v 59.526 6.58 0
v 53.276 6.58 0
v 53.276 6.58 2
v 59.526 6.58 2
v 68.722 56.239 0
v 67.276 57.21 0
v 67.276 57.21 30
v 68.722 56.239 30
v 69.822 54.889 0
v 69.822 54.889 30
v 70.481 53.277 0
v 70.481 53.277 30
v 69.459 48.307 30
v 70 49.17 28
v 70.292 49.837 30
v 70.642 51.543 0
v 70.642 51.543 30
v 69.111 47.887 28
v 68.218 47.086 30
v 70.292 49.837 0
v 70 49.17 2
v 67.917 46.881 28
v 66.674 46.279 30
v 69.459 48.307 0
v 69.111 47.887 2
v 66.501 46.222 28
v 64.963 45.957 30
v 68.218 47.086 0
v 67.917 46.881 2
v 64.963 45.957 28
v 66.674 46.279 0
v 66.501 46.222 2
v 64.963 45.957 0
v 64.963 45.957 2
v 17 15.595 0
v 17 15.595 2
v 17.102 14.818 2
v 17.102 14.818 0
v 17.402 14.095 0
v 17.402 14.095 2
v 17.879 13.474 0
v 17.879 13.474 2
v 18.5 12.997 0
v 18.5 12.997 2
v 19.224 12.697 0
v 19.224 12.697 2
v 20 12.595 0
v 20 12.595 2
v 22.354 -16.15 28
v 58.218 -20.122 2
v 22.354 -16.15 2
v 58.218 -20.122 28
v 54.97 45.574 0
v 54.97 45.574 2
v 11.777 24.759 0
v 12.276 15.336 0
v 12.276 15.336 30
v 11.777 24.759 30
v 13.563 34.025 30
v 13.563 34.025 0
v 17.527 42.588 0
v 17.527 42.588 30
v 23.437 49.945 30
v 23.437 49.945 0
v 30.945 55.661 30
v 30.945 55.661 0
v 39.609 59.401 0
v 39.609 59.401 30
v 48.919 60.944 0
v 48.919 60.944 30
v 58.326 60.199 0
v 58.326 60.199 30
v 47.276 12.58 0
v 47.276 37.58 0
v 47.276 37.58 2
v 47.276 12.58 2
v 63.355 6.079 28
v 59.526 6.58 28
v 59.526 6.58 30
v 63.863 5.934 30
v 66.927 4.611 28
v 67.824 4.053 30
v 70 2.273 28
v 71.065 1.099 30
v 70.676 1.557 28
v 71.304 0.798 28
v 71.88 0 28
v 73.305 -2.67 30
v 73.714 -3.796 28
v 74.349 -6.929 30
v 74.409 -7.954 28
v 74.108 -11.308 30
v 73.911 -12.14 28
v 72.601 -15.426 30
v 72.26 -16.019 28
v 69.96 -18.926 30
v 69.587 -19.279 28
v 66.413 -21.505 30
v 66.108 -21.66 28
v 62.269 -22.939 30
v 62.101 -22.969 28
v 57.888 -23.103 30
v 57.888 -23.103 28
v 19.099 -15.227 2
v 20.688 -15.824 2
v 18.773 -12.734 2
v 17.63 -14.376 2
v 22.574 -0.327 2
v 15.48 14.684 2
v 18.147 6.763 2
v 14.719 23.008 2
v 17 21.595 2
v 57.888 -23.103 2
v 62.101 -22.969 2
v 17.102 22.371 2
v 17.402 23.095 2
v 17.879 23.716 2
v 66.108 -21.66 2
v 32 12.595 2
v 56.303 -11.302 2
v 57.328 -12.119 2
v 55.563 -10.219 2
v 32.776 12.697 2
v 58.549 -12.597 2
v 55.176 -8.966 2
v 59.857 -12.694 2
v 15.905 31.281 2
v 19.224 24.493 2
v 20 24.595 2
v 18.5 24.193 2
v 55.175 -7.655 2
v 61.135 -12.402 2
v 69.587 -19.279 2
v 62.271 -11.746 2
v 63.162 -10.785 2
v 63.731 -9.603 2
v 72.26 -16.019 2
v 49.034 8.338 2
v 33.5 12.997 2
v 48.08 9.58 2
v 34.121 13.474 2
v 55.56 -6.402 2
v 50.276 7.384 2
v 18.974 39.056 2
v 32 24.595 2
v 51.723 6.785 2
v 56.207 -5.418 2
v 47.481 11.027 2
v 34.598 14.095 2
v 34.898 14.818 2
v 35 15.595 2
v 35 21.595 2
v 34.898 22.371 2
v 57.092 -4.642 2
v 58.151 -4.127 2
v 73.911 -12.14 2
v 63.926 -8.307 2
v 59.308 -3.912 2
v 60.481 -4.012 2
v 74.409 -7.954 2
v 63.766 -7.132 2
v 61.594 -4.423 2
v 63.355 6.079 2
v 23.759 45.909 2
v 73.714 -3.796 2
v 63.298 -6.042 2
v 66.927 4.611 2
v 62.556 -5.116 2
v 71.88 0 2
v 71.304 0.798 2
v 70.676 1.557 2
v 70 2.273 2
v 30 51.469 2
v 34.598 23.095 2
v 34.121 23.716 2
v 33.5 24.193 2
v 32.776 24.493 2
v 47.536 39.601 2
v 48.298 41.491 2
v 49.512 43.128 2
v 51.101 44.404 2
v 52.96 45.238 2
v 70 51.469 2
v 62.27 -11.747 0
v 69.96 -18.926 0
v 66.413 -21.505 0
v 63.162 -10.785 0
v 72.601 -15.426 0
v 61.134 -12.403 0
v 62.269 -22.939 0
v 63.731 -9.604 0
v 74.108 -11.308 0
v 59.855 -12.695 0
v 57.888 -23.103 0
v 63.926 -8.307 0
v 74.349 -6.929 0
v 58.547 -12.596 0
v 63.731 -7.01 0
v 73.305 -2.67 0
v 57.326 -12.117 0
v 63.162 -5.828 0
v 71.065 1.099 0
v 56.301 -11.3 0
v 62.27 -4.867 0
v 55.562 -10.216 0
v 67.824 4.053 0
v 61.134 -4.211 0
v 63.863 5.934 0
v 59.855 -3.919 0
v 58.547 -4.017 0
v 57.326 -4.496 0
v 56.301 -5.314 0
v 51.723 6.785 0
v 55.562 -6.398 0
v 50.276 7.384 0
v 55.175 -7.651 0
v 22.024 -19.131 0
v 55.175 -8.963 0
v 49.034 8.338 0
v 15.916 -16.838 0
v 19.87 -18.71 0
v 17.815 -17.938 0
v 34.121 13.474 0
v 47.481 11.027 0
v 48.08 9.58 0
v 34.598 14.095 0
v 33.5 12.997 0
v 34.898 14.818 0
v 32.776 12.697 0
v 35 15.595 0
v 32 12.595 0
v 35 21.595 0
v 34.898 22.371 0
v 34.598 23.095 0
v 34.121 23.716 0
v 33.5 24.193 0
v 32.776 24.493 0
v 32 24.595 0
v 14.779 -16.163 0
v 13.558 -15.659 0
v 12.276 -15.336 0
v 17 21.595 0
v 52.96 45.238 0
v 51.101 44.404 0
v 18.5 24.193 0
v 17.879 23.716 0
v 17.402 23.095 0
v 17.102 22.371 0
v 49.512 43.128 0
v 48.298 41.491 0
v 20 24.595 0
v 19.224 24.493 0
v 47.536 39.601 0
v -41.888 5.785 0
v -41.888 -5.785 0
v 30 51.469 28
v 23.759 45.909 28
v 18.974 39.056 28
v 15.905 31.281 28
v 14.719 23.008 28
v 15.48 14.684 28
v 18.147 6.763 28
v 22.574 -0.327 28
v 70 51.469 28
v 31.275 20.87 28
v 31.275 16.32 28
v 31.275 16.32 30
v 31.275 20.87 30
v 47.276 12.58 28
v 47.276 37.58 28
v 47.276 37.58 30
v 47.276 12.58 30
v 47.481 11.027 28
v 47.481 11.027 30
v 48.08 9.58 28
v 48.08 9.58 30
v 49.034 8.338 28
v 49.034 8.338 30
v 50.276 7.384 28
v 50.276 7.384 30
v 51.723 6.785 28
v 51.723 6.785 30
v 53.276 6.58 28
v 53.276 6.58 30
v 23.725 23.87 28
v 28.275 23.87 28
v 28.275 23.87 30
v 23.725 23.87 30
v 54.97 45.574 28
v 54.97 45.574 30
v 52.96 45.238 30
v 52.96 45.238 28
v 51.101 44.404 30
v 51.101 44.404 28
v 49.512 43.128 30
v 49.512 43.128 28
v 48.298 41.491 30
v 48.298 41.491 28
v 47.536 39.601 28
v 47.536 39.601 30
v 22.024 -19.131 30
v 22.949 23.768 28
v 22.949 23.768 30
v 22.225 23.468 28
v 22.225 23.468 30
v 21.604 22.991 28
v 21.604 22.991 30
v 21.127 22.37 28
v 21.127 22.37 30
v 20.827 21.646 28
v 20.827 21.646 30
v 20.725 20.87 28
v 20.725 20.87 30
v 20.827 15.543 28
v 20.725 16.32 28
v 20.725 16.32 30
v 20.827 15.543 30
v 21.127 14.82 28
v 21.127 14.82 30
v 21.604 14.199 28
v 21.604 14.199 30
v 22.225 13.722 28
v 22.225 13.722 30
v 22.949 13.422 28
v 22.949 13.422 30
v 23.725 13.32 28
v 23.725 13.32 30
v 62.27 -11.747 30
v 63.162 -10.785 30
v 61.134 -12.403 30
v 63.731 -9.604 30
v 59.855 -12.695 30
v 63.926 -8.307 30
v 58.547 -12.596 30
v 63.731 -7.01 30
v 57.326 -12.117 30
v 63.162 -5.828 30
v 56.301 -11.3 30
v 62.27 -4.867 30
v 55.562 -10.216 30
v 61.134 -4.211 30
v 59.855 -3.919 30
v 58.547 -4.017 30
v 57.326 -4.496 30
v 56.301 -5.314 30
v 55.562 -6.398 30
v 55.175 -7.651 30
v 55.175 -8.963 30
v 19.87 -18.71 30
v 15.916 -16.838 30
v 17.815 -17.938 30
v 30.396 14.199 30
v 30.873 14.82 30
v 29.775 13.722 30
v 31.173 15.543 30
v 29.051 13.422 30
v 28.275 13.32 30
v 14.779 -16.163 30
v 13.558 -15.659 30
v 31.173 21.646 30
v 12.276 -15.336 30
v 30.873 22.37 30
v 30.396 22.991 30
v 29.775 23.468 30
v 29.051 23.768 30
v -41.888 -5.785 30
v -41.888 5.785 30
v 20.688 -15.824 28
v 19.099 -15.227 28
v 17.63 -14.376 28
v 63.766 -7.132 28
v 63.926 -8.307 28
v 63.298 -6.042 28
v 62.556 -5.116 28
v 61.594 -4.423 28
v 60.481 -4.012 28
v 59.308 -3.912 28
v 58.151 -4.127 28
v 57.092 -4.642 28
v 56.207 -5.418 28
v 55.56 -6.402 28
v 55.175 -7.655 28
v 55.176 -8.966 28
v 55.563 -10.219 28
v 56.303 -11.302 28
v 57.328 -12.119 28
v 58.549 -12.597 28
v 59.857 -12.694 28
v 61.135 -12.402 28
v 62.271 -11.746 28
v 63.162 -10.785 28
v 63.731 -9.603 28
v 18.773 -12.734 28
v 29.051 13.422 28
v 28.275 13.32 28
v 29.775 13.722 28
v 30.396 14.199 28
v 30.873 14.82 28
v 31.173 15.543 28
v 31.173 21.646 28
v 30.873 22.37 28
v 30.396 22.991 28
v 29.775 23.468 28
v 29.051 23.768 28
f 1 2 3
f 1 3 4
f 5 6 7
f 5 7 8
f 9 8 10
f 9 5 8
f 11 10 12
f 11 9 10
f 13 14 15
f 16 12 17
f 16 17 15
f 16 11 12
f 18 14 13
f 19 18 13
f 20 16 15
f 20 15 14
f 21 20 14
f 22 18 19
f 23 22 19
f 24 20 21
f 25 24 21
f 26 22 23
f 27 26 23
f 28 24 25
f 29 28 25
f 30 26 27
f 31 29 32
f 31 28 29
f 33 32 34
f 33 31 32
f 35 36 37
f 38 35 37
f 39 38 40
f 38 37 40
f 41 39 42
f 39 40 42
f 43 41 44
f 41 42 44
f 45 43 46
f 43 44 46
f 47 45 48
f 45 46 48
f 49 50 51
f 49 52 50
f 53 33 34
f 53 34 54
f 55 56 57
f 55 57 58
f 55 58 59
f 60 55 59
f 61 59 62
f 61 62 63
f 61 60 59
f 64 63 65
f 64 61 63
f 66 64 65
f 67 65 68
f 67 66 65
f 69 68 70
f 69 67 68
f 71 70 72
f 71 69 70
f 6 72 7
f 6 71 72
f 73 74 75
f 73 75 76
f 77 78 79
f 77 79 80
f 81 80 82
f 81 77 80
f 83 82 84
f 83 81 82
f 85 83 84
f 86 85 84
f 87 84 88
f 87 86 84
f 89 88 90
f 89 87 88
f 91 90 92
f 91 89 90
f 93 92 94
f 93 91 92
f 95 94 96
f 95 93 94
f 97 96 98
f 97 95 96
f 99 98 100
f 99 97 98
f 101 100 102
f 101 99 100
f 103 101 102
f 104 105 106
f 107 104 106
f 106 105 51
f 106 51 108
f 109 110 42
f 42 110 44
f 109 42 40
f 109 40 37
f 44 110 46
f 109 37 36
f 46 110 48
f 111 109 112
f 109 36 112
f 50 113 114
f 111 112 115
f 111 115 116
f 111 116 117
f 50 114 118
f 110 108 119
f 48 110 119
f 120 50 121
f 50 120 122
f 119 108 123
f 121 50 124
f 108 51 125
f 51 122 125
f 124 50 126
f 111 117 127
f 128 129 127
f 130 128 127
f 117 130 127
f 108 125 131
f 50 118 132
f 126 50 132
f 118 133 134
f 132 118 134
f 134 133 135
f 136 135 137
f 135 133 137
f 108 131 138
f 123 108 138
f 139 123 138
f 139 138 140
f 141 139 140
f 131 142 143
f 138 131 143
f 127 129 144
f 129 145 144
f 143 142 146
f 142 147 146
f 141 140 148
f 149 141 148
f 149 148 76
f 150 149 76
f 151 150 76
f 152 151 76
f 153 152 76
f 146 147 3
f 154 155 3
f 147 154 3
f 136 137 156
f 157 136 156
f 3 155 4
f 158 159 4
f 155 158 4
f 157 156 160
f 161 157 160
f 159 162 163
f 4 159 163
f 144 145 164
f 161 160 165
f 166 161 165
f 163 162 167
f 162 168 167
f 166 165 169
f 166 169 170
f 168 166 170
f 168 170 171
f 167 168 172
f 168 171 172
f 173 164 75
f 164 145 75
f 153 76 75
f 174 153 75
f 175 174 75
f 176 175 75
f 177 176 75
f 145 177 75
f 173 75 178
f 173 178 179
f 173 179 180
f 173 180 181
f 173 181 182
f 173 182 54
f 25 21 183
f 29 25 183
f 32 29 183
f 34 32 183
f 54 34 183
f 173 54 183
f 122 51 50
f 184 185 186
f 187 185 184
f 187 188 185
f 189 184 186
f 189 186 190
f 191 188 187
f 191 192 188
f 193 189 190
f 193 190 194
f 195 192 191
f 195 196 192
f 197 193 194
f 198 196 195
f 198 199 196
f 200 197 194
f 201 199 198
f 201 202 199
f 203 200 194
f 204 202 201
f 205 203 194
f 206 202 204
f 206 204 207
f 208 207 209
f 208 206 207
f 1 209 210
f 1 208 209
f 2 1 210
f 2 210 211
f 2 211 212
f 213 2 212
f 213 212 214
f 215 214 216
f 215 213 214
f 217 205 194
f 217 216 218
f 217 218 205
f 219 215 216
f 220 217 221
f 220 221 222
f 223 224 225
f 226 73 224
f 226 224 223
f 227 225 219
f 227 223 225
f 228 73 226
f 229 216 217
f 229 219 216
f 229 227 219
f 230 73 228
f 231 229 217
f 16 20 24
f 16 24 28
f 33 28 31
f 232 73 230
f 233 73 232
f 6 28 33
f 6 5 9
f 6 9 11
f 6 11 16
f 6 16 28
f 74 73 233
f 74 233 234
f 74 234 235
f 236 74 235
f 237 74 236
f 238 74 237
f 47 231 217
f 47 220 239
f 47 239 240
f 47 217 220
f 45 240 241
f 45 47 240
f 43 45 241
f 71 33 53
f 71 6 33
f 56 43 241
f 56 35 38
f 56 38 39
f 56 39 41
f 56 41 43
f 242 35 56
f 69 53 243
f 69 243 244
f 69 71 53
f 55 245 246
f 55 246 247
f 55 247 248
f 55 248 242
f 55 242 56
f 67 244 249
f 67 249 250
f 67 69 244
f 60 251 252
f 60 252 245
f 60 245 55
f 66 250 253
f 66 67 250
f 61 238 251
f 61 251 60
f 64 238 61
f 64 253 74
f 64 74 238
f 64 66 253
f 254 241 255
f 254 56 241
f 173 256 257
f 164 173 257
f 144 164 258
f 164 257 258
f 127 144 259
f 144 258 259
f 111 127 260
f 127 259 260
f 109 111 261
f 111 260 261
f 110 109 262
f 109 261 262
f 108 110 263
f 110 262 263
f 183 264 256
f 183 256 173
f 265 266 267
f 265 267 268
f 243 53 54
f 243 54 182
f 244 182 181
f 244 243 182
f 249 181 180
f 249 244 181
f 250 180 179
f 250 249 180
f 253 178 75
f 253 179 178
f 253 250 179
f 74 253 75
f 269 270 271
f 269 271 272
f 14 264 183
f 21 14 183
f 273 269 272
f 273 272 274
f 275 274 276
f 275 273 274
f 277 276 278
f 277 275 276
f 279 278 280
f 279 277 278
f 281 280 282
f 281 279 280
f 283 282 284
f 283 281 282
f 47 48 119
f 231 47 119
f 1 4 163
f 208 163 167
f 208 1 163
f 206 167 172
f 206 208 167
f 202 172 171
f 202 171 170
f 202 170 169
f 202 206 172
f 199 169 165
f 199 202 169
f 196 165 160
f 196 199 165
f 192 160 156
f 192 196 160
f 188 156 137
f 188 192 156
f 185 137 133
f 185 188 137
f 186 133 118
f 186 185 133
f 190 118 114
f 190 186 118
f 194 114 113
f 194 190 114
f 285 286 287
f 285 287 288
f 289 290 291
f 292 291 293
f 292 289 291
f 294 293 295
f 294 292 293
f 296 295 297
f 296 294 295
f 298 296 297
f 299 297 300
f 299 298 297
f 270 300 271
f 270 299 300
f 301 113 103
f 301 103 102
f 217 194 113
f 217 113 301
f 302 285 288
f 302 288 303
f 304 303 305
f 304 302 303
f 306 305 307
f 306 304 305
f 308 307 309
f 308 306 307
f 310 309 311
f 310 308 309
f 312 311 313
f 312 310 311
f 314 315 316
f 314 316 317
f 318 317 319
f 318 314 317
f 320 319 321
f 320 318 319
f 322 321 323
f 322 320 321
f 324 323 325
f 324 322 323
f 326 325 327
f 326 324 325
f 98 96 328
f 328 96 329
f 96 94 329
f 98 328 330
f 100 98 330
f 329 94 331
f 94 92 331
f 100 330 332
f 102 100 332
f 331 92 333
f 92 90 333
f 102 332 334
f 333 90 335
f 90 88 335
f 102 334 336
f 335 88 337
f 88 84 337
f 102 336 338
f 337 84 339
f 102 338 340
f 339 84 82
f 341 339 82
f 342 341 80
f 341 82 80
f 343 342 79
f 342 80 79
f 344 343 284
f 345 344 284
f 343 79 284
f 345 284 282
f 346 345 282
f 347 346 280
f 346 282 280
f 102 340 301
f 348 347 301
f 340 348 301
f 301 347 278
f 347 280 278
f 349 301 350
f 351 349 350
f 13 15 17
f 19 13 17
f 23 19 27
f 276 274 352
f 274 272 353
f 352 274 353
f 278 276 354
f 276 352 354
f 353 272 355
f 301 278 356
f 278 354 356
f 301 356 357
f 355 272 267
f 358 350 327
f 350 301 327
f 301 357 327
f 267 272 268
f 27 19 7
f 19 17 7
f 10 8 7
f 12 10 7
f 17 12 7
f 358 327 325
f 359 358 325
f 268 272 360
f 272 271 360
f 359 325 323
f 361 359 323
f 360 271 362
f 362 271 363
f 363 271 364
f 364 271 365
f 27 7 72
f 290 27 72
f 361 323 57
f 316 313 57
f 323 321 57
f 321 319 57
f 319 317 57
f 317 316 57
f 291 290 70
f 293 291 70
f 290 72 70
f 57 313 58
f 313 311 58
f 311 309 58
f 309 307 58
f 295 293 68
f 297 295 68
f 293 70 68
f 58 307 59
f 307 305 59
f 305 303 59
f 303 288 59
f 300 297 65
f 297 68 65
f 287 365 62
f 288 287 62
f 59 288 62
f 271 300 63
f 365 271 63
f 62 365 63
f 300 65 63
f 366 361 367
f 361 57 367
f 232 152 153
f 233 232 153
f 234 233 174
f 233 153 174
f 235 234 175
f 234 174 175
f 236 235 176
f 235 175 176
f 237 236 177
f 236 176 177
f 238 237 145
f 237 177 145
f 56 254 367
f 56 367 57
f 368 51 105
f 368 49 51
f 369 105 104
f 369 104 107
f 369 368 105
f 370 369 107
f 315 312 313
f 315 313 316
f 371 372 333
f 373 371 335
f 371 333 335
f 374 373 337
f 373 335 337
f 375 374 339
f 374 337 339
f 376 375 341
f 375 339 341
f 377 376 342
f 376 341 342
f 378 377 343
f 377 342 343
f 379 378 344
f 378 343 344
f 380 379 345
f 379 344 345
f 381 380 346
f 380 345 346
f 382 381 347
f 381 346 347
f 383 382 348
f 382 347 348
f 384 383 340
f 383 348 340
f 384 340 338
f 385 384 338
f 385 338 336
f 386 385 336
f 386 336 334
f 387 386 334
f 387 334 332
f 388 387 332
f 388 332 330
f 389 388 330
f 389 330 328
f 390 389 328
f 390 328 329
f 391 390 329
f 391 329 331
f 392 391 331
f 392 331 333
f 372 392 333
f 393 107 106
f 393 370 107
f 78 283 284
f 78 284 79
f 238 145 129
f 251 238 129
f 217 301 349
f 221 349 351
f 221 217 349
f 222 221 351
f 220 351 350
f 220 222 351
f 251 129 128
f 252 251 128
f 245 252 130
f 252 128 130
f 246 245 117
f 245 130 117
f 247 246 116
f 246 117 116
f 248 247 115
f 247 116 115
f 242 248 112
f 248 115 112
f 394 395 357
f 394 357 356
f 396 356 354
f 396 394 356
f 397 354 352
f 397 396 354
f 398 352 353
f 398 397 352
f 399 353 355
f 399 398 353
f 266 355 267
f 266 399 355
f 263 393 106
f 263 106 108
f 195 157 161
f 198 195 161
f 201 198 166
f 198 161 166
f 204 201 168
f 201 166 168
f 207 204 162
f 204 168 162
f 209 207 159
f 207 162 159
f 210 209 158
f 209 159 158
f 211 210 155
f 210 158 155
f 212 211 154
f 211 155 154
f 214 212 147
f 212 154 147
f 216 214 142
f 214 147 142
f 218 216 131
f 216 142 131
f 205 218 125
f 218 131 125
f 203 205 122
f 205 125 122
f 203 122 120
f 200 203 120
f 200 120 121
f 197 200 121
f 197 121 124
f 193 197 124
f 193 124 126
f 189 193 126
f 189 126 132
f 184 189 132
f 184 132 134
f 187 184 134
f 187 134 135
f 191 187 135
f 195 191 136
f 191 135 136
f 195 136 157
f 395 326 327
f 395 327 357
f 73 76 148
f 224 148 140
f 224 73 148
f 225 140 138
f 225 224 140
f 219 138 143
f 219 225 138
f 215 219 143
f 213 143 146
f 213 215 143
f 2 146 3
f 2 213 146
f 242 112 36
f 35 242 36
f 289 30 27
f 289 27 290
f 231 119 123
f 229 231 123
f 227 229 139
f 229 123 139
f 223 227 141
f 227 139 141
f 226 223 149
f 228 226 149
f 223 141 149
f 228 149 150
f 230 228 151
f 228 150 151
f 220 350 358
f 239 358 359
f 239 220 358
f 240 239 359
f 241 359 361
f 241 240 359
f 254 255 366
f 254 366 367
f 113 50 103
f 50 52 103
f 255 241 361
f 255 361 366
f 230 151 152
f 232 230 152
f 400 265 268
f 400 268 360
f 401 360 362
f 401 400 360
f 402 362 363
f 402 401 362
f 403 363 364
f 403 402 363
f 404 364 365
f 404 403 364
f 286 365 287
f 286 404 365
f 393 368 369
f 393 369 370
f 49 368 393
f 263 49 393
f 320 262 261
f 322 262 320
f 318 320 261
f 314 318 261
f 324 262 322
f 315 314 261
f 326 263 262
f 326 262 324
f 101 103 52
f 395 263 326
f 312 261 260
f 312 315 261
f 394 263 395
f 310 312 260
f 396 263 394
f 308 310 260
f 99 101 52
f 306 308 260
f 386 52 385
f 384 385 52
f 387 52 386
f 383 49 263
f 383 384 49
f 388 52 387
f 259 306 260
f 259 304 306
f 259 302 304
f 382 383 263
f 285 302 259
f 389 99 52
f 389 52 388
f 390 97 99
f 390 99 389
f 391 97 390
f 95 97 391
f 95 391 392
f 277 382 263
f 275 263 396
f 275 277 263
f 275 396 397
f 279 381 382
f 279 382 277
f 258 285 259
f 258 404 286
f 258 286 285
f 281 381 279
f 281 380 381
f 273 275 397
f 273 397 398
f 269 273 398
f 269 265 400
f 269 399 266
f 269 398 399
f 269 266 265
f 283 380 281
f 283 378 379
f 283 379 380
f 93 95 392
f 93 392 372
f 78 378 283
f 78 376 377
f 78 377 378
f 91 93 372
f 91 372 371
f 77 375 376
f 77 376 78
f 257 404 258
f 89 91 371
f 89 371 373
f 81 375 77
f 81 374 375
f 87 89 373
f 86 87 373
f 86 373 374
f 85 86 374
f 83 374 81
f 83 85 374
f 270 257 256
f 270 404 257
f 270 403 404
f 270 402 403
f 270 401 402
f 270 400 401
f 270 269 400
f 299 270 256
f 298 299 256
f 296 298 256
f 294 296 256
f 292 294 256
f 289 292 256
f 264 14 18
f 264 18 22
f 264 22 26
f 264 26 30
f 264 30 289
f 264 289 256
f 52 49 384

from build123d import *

# Parameters (mm, degrees)
BOSS_EXTRUDE1_DEPTH = 30
SKETCH2_R           = 4.4
CUT_EXTRUDE1_DEPTH  = 101.775803332
SKETCH4_W           = 26
SKETCH4_H           = 53.255509589
CUT_EXTRUDE2_DEPTH  = 40
CUT_EXTRUDE3_DEPTH  = 13
CUT_EXTRUDE4_DEPTH  = 22
CUT_EXTRUDE5_DEPTH  = 29
CUT_EXTRUDE6_DEPTH  = 13
CUT_EXTRUDE7_DEPTH  = 13
CUT_EXTRUDE8_DEPTH  = 13
CUT_EXTRUDE9_DEPTH  = 13


with BuildPart() as part:
    # Sketch1 → Boss-Extrude1 (new body)
    with BuildSketch(Plane.XY):
        with BuildLine():
            Line((-41.88810428, 5.785), (12.276322136, 15.335649772))
            ThreePointArc((12.276322136, 15.335649772), (27.01721186, 53.031344507), (67.276322136, 57.210252411))
            ThreePointArc((67.276322136, 57.210252411), (70.530137672, 50.676906919), (64.962620823, 45.957301533))
            Line((64.962620823, 45.957301533), (54.969956327, 45.574344273))
            ThreePointArc((54.969956327, 45.574344273), (49.512168838, 43.127692894), (47.276322136, 37.580212676))
            Line((47.276322136, 37.580212676), (47.276322136, 12.580212676))
            ThreePointArc((47.276322136, 12.580212676), (49.033681448, 8.337571989), (53.276322136, 6.580212676))
            Line((53.276322136, 6.580212676), (59.526322136, 6.580212676))
            ThreePointArc((59.526322136, 6.580212676), (74.390705288, -9.127420407), (57.887586742, -23.103353356))
            Line((57.887586742, -23.103353356), (22.023718903, -19.131387173))
            ThreePointArc((22.023718903, -19.131387173), (18.826238067, -18.366578697), (15.915778413, -16.837513523))
            ThreePointArc((15.915778413, -16.837513523), (14.177787103, -15.888509343), (12.276322136, -15.335649772))
            Line((12.276322136, -15.335649772), (-41.88810428, -5.785))
            Line((-41.88810428, -5.785), (-41.88810428, 5.785))
        make_face()
    extrude(amount=BOSS_EXTRUDE1_DEPTH)

    # Sketch2 → Cut-Extrude1 (cut, through all)
    with BuildSketch(Plane.XY.offset(30)):
        with Locations((59.526322136, -8.306805028)):
            Circle(SKETCH2_R)
    extrude(amount=-CUT_EXTRUDE1_DEPTH, mode=Mode.SUBTRACT)

    # Sketch4 → Cut-Extrude2 (cut)
    with BuildSketch(Plane(origin=(70, 0, 0), x_dir=(0, 0, -1), z_dir=(1, 0, 0))):
        with Locations((-15, 24.841006249)):
            Rectangle(SKETCH4_W, SKETCH4_H)
    extrude(amount=-CUT_EXTRUDE2_DEPTH, mode=Mode.SUBTRACT)

    # Sketch5 → Cut-Extrude3 (cut, symmetric)
    with BuildSketch(Plane.XY.offset(15)):
        with BuildLine():
            ThreePointArc((30, 51.468761043), (14.752383127, 23.887752406), (27.160195833, -5.082025668))
            add(Edge.make_bspline(
                [(27.160195833, -5.082025668), (28.094948904, -5.887577241), (30.586732107, -8.19455625), (37.238701336, -9.917559519), (48.959505276, -8.540216128), (58.394612416, -6.238640535), (63.488820328, -1.786748546)],
                knots=[0, 0, 0, 0, 0.09340361, 0.26111983, 0.503691176, 1, 1, 1, 1], degree=3))
            Line((63.488820328, -1.786748546), (35, -1.786748546))
            ThreePointArc((35, -1.786748546), (31.464466094, -0.322282452), (30, 3.213251454))
            Line((30, 3.213251454), (30, 51.468761043))
        make_face()
    extrude(amount=CUT_EXTRUDE3_DEPTH, both=True, mode=Mode.SUBTRACT)

    # Sketch6 → Cut-Extrude4 (cut)
    with BuildSketch(Plane.XY.offset(15)):
        with BuildLine():
            Line((32, 24.594919279), (20, 24.594919279))
            ThreePointArc((20, 24.594919279), (17.878679656, 23.716239623), (17, 21.594919279))
            Line((17, 21.594919279), (17, 15.594919279))
            ThreePointArc((17, 15.594919279), (17.878679656, 13.473598935), (20, 12.594919279))
            Line((20, 12.594919279), (32, 12.594919279))
            ThreePointArc((32, 12.594919279), (34.121320344, 13.473598935), (35, 15.594919279))
            Line((35, 15.594919279), (35, 21.594919279))
            ThreePointArc((35, 21.594919279), (34.121320344, 23.716239623), (32, 24.594919279))
        make_face()
    extrude(amount=-CUT_EXTRUDE4_DEPTH, mode=Mode.SUBTRACT)

    # Sketch7 → Cut-Extrude5 (cut)
    with BuildSketch(Plane.XY.offset(15)):
        with BuildLine():
            Line((28.275, 23.869919279), (23.725, 23.869919279))
            ThreePointArc((23.725, 23.869919279), (21.603679656, 22.991239623), (20.725, 20.869919279))
            Line((20.725, 20.869919279), (20.725, 16.319919279))
            ThreePointArc((20.725, 16.319919279), (21.603679656, 14.198598935), (23.725, 13.319919279))
            Line((23.725, 13.319919279), (28.275, 13.319919279))
            ThreePointArc((28.275, 13.319919279), (30.396320344, 14.198598935), (31.275, 16.319919279))
            Line((31.275, 16.319919279), (31.275, 20.869919279))
            ThreePointArc((31.275, 20.869919279), (30.396320344, 22.991239623), (28.275, 23.869919279))
        make_face()
    extrude(amount=CUT_EXTRUDE5_DEPTH, mode=Mode.SUBTRACT)

    # Sketch9 → Cut-Extrude6 (cut, symmetric)
    with BuildSketch(Plane.XY.offset(15)):
        with BuildLine():
            add(Edge.make_bspline(
                [(27.160195833, -5.082025668), (28.094948904, -5.887577241), (30.586732107, -8.19455625), (37.238701336, -9.917559519), (45.927597, -8.896503874), (52.39349387, -7.580878177), (55.560202392, -6.40157691)],
                knots=[0, 0, 0, 0, 0.09340361, 0.26111983, 0.503691176, 0.765483911, 0.765483911, 0.765483911, 0.765483911], degree=3))
            ThreePointArc((55.560202392, -6.40157691), (61.448410701, -12.264781222), (60.481418473, -4.011715857))
            add(Edge.make_bspline(
                [(60.481418473, -4.011715857), (61.522798548, -3.362828802), (62.527928844, -2.626483629), (63.488820328, -1.786748546)],
                knots=[0.906384087, 0.906384087, 0.906384087, 0.906384087, 1, 1, 1, 1], degree=3))
            Line((63.488820328, -1.786748546), (66.958817178, -1.786748546))
            ThreePointArc((66.958817178, -1.786748546), (68.293766616, -12.876819947), (58.4379775, -18.133738682))
            Line((58.4379775, -18.133738682), (22.574109661, -14.161772498))
            ThreePointArc((22.574109661, -14.161772498), (20.584136694, -13.685788976), (18.772793224, -12.734165333))
            Line((18.772793224, -12.734165333), (22.574109661, -0.326656193))
            Line((22.574109661, -0.326656193), (27.160195833, -5.082025668))
        make_face()
    extrude(amount=CUT_EXTRUDE6_DEPTH, both=True, mode=Mode.SUBTRACT)

    # Sketch10 → Cut-Extrude7 (cut, symmetric)
    with BuildSketch(Plane.XY.offset(15)):
        with BuildLine():
            Line((66.958817178, -1.786748546), (70, -1.786748546))
            Line((70, -1.786748546), (70.49467045, -3.724608486))
            ThreePointArc((70.49467045, -3.724608486), (69.041750074, -15.431257361), (58.217821197, -20.121584551))
            Line((58.217821197, -20.121584551), (22.353953358, -16.149618368))
            ThreePointArc((22.353953358, -16.149618368), (19.880977243, -15.558104864), (17.6299873, -14.375504609))
            Line((17.6299873, -14.375504609), (18.772793224, -12.734165333))
            ThreePointArc((18.772793224, -12.734165333), (20.584136694, -13.685788976), (22.574109661, -14.161772498))
            Line((22.574109661, -14.161772498), (58.4379775, -18.133738682))
            ThreePointArc((58.4379775, -18.133738682), (68.293766616, -12.876819947), (66.958817178, -1.786748546))
        make_face()
    extrude(amount=CUT_EXTRUDE7_DEPTH, both=True, mode=Mode.SUBTRACT)

    # Sketch11 → Cut-Extrude8 (cut, symmetric)
    with BuildSketch(Plane.XY.offset(15)):
        with BuildLine():
            Line((58.217821197, -20.121584551), (57.887586742, -23.103353356))
            ThreePointArc((57.887586742, -23.103353356), (72.259948277, -16.01900714), (71.880280462, 0))
            Line((71.880280462, 0), (70, 0))
            Line((70, 0), (70, -1.786748546))
            Line((70, -1.786748546), (70.49467045, -3.724608486))
            ThreePointArc((70.49467045, -3.724608486), (69.041750074, -15.431257361), (58.217821197, -20.121584551))
        make_face()
    extrude(amount=CUT_EXTRUDE8_DEPTH, both=True, mode=Mode.SUBTRACT)

    # Sketch12 → Cut-Extrude9 (cut, symmetric)
    with BuildSketch(Plane.XY.offset(15)):
        with BuildLine():
            Line((70, 0), (70, 2.272673603))
            ThreePointArc((70, 2.272673603), (70.996566459, 1.183020643), (71.880280462, 0))
            Line((71.880280462, 0), (70, 0))
        make_face()
    extrude(amount=CUT_EXTRUDE9_DEPTH, both=True, mode=Mode.SUBTRACT)


solid = part.part
